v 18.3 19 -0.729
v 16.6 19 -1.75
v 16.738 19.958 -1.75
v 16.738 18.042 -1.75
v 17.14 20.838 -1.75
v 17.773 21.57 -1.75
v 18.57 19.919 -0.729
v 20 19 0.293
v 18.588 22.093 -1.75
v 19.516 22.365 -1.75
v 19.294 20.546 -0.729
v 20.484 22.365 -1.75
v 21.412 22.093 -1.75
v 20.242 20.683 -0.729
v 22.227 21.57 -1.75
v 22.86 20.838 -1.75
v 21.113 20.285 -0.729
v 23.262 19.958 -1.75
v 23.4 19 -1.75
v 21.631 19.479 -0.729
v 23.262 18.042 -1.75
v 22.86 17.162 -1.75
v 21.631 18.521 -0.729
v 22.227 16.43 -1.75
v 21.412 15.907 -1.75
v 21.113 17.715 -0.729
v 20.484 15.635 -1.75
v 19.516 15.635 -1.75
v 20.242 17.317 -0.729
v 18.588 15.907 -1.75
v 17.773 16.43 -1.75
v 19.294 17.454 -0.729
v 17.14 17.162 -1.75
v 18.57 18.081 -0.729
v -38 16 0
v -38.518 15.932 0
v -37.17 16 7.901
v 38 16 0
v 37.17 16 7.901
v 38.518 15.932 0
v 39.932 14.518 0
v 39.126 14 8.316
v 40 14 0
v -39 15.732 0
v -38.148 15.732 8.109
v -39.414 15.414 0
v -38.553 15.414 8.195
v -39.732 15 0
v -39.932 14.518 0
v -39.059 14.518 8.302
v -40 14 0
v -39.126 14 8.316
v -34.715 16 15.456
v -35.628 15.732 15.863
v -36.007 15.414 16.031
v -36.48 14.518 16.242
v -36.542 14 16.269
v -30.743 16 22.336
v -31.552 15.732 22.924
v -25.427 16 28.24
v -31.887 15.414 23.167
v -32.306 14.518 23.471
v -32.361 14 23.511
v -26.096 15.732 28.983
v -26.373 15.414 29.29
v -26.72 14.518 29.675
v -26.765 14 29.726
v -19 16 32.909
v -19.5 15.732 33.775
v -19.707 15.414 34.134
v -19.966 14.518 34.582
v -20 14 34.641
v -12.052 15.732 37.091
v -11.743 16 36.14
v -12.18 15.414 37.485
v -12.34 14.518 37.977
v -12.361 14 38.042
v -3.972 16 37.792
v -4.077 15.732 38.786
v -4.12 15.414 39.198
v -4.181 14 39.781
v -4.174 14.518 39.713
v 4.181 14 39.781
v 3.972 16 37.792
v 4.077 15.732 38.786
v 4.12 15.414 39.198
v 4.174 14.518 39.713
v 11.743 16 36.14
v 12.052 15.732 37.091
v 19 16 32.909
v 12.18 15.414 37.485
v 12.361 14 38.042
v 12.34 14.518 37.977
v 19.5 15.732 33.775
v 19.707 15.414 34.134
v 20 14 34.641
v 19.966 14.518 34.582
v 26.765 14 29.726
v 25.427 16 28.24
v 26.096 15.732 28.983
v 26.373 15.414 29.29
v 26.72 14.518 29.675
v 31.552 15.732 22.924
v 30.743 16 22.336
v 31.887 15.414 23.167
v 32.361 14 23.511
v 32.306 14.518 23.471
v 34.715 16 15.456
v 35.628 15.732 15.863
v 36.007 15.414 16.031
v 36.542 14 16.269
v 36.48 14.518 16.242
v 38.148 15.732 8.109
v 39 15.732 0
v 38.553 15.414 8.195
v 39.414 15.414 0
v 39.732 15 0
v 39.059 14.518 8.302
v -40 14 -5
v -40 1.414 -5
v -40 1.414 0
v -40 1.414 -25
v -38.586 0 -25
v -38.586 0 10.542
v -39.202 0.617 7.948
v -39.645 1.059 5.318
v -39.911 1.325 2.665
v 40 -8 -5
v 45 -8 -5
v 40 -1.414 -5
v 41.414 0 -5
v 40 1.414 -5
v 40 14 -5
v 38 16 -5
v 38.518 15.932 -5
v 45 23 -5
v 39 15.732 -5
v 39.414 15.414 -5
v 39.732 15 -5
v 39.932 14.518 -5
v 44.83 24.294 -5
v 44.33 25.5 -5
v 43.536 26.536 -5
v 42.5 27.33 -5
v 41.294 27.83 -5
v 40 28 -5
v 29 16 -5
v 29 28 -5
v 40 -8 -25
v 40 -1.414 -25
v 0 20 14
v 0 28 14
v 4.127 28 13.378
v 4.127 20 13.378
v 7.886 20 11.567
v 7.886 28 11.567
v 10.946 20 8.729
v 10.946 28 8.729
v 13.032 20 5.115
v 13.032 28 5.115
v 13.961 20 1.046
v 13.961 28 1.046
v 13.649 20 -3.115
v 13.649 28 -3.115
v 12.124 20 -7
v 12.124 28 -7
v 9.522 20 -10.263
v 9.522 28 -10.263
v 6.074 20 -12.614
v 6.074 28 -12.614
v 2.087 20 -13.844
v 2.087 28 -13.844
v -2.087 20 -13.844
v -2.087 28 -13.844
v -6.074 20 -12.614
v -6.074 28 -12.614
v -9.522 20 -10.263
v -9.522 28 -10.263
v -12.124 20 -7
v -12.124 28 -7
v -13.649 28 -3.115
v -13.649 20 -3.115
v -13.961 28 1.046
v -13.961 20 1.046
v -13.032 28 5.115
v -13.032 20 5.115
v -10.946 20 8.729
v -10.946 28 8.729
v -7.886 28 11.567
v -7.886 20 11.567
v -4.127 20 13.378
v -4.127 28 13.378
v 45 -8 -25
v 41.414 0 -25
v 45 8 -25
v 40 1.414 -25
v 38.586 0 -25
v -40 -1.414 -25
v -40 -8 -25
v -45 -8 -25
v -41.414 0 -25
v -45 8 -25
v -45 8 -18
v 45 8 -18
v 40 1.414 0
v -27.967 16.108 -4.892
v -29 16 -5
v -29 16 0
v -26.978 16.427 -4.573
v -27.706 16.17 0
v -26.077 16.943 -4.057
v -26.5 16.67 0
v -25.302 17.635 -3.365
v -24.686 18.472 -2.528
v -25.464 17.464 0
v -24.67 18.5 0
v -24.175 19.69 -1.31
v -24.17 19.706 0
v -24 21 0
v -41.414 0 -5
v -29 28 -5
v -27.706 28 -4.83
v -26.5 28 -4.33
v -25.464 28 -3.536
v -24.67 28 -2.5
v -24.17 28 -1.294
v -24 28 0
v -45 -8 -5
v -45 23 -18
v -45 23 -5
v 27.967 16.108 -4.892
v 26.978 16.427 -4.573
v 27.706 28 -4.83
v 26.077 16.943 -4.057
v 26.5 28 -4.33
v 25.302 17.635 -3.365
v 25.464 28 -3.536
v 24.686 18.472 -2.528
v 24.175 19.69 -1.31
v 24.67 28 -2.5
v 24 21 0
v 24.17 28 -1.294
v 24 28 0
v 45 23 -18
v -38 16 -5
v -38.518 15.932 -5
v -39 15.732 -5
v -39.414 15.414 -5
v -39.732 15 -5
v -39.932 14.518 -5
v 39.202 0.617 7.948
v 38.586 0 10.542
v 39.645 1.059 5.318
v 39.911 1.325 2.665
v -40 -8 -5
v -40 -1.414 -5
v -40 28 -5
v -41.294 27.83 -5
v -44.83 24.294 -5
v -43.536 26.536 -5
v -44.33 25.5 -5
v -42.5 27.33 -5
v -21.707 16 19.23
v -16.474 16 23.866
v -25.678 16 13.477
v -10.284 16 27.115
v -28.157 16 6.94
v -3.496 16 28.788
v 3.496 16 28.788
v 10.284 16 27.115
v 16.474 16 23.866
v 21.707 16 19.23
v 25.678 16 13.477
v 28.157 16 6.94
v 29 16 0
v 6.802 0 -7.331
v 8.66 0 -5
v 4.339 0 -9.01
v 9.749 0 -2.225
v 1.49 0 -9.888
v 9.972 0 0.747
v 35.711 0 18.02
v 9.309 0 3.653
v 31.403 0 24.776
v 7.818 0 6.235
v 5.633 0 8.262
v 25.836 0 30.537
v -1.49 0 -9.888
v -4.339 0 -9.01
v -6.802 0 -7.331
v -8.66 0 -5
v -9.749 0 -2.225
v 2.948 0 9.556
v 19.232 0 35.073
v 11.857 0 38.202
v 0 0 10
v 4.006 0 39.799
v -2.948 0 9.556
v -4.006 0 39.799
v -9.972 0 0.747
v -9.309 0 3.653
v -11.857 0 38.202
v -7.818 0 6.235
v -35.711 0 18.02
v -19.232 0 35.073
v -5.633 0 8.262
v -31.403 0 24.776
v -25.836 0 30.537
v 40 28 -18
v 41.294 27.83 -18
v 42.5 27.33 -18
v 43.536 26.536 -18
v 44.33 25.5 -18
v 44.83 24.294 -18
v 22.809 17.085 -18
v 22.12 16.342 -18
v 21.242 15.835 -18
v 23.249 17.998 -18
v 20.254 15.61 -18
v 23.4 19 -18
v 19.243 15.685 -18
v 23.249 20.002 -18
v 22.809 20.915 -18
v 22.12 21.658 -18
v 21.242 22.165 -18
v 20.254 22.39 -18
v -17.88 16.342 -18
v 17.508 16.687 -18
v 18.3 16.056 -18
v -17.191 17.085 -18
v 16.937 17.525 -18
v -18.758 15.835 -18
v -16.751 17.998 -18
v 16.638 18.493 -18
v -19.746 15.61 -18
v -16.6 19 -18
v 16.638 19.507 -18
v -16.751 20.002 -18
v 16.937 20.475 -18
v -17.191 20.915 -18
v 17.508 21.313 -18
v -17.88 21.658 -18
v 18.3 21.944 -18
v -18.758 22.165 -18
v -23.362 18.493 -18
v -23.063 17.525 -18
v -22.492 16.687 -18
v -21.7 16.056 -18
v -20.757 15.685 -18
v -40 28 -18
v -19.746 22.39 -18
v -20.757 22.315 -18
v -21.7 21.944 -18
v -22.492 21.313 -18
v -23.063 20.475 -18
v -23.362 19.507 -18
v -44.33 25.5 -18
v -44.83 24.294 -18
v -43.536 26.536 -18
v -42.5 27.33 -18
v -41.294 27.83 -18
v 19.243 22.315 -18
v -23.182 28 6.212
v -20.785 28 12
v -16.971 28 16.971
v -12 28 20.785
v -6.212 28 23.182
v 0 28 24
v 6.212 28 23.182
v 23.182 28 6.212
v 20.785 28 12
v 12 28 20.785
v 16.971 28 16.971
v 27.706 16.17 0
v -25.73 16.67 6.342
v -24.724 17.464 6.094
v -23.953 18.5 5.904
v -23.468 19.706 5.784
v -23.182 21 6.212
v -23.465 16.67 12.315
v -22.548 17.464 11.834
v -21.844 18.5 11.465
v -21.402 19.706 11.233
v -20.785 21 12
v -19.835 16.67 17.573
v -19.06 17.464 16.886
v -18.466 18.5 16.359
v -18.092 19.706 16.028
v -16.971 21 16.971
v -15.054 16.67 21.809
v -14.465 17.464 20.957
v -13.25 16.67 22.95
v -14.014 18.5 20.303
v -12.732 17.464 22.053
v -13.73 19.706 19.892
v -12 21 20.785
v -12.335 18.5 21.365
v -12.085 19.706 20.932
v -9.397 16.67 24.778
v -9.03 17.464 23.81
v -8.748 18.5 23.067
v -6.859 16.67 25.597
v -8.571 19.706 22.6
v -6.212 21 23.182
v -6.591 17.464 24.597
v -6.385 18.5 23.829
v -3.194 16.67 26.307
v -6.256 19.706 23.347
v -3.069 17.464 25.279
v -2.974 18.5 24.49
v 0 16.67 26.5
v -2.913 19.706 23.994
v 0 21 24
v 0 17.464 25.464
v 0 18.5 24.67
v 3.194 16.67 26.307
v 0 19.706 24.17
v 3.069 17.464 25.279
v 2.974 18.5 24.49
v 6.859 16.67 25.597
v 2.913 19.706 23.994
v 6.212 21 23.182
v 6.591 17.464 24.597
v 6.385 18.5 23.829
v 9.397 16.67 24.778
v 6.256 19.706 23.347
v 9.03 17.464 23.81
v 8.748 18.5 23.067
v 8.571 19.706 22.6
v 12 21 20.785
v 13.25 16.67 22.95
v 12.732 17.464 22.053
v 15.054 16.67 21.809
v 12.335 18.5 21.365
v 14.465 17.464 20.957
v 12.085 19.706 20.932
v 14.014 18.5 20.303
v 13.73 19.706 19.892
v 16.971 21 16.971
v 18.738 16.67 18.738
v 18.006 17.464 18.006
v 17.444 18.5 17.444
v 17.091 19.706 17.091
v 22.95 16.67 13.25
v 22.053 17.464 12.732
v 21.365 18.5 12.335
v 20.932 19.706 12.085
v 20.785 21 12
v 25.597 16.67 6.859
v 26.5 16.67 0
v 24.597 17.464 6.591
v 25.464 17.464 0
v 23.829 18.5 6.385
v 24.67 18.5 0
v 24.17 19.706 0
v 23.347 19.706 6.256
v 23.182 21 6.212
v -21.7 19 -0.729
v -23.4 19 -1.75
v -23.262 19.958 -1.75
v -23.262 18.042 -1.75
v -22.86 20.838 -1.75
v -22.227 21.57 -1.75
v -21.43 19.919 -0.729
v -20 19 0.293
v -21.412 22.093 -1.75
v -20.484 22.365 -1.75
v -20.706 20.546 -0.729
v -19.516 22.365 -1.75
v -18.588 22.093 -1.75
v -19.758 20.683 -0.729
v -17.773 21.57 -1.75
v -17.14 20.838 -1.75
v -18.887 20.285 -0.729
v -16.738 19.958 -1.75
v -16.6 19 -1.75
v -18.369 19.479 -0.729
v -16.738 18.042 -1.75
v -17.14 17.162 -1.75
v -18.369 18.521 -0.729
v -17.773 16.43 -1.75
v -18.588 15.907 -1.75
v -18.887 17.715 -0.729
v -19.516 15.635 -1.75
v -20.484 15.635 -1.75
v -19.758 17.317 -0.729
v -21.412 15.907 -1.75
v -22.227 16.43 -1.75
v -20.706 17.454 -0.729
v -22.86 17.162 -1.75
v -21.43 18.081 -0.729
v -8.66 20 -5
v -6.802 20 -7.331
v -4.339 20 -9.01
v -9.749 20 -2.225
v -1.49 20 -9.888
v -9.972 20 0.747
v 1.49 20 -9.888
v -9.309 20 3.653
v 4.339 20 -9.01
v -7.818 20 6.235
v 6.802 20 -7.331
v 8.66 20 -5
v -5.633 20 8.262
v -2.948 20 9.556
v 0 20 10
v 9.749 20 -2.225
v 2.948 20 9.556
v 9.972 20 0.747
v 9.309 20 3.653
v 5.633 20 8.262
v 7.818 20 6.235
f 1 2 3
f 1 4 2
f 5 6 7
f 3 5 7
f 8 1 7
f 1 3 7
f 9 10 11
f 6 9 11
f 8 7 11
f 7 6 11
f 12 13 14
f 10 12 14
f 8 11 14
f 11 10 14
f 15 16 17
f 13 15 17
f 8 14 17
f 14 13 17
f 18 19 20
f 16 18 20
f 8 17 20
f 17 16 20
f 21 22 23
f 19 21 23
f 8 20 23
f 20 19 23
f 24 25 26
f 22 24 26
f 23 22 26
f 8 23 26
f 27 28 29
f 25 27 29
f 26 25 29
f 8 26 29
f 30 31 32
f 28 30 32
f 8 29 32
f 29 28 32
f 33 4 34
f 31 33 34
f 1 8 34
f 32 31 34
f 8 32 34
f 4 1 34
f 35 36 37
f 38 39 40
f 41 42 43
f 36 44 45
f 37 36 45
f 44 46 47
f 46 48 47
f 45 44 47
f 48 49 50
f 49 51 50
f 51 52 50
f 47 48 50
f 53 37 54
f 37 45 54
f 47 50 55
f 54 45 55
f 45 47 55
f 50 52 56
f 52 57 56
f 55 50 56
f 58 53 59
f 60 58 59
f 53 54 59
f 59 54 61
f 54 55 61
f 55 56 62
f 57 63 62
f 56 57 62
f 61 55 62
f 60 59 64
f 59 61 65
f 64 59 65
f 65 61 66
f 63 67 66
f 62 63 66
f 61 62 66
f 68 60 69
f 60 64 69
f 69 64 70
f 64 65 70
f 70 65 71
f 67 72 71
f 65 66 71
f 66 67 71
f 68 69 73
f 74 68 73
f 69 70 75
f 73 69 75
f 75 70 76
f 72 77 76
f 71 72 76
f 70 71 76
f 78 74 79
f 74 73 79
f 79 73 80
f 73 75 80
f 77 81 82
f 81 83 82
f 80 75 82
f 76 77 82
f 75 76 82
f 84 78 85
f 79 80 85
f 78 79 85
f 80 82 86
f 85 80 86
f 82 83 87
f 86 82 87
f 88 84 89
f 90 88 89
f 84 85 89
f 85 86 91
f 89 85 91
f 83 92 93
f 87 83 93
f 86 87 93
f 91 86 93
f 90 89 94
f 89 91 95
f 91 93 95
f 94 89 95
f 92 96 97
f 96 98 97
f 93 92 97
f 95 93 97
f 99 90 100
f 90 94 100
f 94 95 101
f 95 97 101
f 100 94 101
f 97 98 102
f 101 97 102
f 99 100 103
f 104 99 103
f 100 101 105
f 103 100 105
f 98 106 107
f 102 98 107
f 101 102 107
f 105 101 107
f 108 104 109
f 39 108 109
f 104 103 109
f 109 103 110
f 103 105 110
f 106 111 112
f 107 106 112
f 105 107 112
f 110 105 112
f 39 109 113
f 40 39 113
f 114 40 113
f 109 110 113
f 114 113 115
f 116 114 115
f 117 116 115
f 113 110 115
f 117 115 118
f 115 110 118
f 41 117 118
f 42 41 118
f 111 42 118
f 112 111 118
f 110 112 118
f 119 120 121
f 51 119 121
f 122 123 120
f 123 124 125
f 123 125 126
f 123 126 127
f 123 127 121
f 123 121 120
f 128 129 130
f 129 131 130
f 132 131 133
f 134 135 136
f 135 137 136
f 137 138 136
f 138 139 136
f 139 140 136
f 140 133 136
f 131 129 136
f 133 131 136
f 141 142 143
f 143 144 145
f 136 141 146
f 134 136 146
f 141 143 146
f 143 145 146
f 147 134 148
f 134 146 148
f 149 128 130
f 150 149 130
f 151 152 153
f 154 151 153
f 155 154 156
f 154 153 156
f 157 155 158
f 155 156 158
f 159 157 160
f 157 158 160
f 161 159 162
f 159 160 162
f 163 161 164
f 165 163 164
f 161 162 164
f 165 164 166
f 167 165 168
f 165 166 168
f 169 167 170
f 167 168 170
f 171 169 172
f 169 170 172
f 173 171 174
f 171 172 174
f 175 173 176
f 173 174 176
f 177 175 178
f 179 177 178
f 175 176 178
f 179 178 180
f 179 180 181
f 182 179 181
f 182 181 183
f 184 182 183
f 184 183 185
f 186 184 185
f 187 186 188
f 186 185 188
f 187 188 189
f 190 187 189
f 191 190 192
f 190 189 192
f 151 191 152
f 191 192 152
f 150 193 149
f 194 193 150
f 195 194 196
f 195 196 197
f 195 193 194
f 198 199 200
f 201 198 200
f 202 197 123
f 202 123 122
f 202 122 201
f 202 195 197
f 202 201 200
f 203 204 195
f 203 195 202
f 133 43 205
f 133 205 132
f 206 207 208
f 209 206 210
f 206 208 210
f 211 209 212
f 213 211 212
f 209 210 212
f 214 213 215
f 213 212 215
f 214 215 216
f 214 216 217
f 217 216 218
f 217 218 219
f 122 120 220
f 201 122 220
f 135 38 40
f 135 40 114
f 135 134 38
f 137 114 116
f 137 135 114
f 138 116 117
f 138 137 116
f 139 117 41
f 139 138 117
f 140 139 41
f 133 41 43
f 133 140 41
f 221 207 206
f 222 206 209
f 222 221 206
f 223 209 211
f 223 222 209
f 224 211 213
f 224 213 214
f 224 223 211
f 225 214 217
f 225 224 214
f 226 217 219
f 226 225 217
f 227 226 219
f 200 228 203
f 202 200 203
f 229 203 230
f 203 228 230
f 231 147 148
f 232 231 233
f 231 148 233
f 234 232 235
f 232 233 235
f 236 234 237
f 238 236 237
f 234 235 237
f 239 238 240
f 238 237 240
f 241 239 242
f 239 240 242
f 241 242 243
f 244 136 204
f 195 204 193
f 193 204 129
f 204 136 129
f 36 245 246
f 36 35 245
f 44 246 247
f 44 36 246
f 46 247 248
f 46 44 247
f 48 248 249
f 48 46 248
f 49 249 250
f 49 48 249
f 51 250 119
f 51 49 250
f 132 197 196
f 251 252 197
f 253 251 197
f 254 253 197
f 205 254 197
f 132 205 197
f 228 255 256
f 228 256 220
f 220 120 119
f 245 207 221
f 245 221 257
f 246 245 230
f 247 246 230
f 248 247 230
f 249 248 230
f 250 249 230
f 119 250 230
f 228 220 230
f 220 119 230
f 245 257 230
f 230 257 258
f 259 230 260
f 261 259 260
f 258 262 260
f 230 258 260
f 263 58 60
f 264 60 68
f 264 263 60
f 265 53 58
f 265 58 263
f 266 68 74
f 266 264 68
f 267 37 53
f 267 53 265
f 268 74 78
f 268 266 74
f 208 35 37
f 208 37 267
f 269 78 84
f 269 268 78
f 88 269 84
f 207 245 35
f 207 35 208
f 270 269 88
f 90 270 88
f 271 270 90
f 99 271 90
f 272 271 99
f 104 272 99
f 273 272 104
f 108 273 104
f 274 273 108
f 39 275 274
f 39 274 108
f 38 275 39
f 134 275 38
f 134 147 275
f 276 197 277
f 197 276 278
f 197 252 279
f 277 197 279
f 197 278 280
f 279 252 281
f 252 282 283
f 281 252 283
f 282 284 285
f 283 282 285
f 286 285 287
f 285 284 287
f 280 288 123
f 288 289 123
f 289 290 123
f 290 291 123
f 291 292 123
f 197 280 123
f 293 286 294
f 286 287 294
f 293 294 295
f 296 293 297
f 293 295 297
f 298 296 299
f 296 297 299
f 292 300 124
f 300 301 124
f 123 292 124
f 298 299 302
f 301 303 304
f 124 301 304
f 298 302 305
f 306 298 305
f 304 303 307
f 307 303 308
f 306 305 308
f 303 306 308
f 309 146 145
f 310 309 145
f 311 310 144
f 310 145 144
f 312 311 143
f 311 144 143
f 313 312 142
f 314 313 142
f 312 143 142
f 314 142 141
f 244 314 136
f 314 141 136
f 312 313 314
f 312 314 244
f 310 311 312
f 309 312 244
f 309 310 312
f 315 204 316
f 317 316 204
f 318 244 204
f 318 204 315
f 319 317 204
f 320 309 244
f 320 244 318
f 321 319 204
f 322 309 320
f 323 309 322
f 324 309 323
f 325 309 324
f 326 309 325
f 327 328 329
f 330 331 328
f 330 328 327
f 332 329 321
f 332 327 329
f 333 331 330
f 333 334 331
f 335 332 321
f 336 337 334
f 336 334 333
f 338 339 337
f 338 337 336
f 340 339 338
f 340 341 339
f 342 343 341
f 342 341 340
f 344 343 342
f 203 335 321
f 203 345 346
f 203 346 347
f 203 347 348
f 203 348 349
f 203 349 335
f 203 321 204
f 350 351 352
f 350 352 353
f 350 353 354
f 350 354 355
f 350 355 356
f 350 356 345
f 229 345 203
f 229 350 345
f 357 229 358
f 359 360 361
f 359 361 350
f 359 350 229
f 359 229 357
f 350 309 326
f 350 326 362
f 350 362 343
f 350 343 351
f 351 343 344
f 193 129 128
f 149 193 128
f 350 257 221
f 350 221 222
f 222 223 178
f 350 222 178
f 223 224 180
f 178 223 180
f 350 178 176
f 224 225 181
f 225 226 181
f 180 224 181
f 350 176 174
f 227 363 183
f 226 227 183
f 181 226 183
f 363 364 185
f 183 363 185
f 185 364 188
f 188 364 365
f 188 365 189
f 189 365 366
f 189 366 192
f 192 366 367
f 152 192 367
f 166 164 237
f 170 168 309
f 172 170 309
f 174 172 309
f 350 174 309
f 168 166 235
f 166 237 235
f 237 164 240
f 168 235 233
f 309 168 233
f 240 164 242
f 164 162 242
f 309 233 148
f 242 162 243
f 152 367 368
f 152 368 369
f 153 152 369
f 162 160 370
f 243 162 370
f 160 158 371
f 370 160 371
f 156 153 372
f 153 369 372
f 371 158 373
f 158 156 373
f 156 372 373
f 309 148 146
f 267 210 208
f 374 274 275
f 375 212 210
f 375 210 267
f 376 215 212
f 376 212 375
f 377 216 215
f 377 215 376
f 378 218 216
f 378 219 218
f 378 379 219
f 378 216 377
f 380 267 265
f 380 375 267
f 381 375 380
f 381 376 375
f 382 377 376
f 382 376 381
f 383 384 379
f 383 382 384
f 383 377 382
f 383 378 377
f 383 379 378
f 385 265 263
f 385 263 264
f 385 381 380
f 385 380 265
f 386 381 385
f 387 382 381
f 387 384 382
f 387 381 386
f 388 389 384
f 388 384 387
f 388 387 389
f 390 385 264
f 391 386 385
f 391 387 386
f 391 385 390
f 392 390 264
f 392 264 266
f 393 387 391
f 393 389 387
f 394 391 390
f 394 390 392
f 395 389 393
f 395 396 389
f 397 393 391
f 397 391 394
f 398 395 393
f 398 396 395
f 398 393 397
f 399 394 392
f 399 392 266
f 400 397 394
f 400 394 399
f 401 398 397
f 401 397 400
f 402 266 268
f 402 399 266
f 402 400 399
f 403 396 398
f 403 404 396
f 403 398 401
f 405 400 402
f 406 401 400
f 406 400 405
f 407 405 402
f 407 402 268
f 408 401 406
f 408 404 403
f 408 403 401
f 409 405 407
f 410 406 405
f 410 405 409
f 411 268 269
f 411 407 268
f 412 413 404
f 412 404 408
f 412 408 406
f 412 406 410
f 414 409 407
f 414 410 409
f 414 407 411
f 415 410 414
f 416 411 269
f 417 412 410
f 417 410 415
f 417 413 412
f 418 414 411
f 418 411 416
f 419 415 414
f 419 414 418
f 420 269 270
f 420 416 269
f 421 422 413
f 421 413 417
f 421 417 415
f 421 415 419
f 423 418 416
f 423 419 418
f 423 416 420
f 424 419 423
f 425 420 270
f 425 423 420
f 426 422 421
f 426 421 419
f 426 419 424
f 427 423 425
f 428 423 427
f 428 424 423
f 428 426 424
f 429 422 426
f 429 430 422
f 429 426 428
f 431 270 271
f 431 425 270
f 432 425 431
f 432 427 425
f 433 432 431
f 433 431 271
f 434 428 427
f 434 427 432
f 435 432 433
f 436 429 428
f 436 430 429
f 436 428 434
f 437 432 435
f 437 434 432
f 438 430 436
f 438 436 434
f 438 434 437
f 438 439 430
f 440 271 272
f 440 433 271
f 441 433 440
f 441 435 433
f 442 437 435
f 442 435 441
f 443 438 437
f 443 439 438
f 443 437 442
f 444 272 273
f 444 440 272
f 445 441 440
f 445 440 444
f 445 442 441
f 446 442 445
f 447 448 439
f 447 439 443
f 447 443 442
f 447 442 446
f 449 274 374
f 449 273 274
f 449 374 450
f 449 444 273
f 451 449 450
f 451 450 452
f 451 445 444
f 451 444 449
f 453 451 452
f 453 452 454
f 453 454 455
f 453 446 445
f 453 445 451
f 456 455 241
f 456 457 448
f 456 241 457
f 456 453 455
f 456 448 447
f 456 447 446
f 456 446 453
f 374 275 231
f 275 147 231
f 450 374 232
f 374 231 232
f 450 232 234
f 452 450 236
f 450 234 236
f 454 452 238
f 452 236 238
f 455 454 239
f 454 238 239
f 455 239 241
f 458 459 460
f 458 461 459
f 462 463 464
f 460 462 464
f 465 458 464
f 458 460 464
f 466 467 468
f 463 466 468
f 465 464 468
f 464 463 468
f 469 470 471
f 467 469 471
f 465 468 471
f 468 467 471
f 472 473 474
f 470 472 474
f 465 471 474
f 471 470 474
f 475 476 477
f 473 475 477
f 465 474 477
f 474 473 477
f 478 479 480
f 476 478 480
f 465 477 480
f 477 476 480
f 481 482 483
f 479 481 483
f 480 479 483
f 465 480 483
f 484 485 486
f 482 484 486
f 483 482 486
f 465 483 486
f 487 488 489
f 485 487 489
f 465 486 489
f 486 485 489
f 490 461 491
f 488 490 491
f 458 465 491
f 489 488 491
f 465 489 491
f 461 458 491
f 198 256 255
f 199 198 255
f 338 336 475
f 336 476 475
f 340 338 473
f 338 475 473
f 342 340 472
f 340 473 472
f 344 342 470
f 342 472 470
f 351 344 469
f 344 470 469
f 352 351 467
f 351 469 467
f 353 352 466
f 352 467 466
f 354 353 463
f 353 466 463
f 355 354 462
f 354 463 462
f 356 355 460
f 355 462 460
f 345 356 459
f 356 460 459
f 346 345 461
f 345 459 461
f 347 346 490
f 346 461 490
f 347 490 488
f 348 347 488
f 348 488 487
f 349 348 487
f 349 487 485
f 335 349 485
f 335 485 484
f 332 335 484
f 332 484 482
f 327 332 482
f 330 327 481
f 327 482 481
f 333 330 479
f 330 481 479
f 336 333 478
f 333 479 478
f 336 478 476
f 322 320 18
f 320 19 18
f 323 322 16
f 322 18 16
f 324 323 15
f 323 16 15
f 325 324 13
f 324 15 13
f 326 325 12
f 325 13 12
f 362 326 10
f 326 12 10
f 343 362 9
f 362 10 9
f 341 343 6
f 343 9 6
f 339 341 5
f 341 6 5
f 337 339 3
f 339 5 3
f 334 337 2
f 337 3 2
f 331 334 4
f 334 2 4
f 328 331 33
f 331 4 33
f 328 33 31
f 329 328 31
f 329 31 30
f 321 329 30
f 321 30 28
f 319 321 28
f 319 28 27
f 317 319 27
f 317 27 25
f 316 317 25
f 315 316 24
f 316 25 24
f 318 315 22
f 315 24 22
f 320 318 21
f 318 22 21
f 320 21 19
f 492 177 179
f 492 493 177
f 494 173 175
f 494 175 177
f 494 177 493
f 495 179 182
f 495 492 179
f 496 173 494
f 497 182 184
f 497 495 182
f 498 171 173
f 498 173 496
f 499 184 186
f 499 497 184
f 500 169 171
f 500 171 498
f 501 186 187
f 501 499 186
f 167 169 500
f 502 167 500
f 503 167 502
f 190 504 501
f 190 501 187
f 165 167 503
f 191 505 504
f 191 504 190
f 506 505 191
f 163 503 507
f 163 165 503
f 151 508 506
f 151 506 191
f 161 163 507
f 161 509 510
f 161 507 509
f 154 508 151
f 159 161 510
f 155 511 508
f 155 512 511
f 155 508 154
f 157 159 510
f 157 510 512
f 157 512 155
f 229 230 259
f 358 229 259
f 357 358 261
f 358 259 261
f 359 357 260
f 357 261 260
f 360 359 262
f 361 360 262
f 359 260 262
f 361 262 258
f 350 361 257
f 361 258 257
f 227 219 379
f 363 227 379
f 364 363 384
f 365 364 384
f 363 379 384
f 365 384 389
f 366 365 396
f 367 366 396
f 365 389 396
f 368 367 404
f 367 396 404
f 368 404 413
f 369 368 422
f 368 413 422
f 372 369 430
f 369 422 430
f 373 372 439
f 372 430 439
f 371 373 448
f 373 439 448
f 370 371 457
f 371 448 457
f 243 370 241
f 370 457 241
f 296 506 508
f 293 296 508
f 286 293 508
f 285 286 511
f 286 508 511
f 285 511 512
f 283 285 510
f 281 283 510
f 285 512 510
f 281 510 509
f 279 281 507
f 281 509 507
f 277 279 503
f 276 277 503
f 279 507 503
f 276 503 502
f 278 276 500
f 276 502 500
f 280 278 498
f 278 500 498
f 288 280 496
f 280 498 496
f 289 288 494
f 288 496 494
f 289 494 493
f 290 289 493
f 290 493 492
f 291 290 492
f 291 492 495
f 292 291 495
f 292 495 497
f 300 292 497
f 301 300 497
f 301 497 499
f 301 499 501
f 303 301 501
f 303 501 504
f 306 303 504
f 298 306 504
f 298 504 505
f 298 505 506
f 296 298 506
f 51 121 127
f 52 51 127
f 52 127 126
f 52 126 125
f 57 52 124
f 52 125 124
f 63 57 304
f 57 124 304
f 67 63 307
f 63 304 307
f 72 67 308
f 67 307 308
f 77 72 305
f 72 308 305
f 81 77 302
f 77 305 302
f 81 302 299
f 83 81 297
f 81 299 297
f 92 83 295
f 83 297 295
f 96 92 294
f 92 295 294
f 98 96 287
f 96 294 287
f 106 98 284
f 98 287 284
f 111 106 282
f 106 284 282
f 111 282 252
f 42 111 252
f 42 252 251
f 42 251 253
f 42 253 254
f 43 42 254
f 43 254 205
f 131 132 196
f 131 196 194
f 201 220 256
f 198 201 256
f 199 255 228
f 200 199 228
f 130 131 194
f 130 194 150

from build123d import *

# Parameters (mm, degrees)
EXTRUDE_1_DEPTH        = 16
EXTRUDE_2_DEPTH        = 12
EXTRUDE_3_DEPTH        = 20
CUT_EXTRUDE_START      = -7
CUT_EXTRUDE_1_DEPTH    = 7
SKETCH_6_R             = 10
CUT_EXTRUDE_2_DEPTH    = 71.149839629
SKETCH_7_R             = 14
CUT_EXTRUDE_3_DEPTH    = 8
HOLE_WIZARD_M8_1_D     = 6.8
HOLE_WIZARD_M8_1_DEPTH = 16.25
HOLE_WIZARD_M8_1_TIP   = 2.042926105
CUT_EXTRUDE_4_DEPTH    = 84.868945385
FILLET_3_R             = 2
FILLET_6_R             = 5


with BuildPart() as part:
    # 草图1 → 凸台-拉伸1 (new body)
    with BuildSketch(Plane(origin=(0, 0, 0), x_dir=(1, 0, 0), z_dir=(0, 1, 0))):
        with BuildLine():
            Line((40, 5), (-40, 5))
            Line((-40, 5), (-40, 0))
            ThreePointArc((-40, 0), (0, -40), (40, 0))
            Line((40, 0), (40, 5))
        make_face()
    extrude(amount=EXTRUDE_1_DEPTH)

    # 草图3 → 凸台-拉伸2 (add)
    with BuildSketch(Plane(origin=(0, 16, 0), x_dir=(1, 0, 0), z_dir=(0, 1, 0))):
        with BuildLine():
            Line((-24, 5), (-24, 0))
            ThreePointArc((-24, 0), (0, -24), (24, 0))
            Line((24, 0), (24, 5))
            Line((24, 5), (-24, 5))
        make_face()
    extrude(amount=EXTRUDE_2_DEPTH)

    # 草图4 → 凸台-拉伸3 (add)
    with BuildSketch(Plane(origin=(0, 0, -5), x_dir=(-1, 0, 0), z_dir=(0, 0, -1))):
        with BuildLine():
            Line((-45, 23), (-45, -8))
            Line((-45, -8), (-40, -8))
            Line((-40, -8), (-40, 0))
            Line((-40, 0), (40, 0))
            Line((40, 0), (40, -8))
            Line((40, -8), (45, -8))
            Line((45, -8), (45, 23))
            ThreePointArc((45, 23), (43.535533906, 26.535533906), (40, 28))
            Line((40, 28), (-40, 28))
            ThreePointArc((-40, 28), (-43.535533906, 26.535533906), (-45, 23))
        make_face()
    extrude(amount=EXTRUDE_3_DEPTH)

    # 草图5 → 切除-拉伸1 (cut)
    with BuildSketch(Plane(origin=(0, 0, -25), x_dir=(-1, 0, 0), z_dir=(0, 0, -1)).offset(CUT_EXTRUDE_START)):
        with BuildLine():
            Line((-45, 8), (45, 8))
            Line((45, 8), (45, 23))
            ThreePointArc((45, 23), (43.535533906, 26.535533906), (40, 28))
            Line((40, 28), (-40, 28))
            ThreePointArc((-40, 28), (-43.535533906, 26.535533906), (-45, 23))
            Line((-45, 23), (-45, 8))
        make_face()
    extrude(amount=CUT_EXTRUDE_1_DEPTH, mode=Mode.SUBTRACT)

    # 草图6 → 切除-拉伸2 (cut, through all)
    with BuildSketch(Plane(origin=(0, 28, 0), x_dir=(1, 0, 0), z_dir=(0, 1, 0))):
        with Locations(Location((0, 0, 0), (0, 0, 270))):
            Circle(SKETCH_6_R)
    extrude(amount=-CUT_EXTRUDE_2_DEPTH, mode=Mode.SUBTRACT)

    # 草图7 → 切除-拉伸3 (cut)
    with BuildSketch(Plane(origin=(0, 28, 0), x_dir=(1, 0, 0), z_dir=(0, 1, 0))):
        with Locations(Location((0, 0, 0), (0, 0, 270))):
            Circle(SKETCH_7_R)
    extrude(amount=-CUT_EXTRUDE_3_DEPTH, mode=Mode.SUBTRACT)

    # M8 螺纹孔1
    with Locations(Plane(origin=(0, 0, -18), x_dir=(-1, 0, 0), z_dir=(0, 0, -1))):
        with Locations((-20, 19), (20, 19)):
            Hole(HOLE_WIZARD_M8_1_D / 2, depth=HOLE_WIZARD_M8_1_DEPTH)
            with Locations((0, 0, -(HOLE_WIZARD_M8_1_DEPTH + HOLE_WIZARD_M8_1_TIP / 2))):  # 118° drill point
                Cone(0, HOLE_WIZARD_M8_1_D / 2, HOLE_WIZARD_M8_1_TIP, mode=Mode.SUBTRACT)

    # 草图12 → 切除-拉伸4 (cut, through all)
    with BuildSketch(Plane(origin=(0, 0, -25), x_dir=(-1, 0, 0), z_dir=(0, 0, -1))):
        Polygon((-38.585786438, 0), (-40, 1.414213562), (-41.414213562, 0), (-40, -1.414213562), (-40, 0), align=None)
    cut_extrude_4 = extrude(amount=-CUT_EXTRUDE_4_DEPTH, mode=Mode.SUBTRACT)

    # 镜向1: 切除-拉伸4 across plane
    add(cut_extrude_4.mirror(Plane(origin=(0, 0, 0), x_dir=(0, 0, 1), z_dir=(1, 0, 0))), mode=Mode.SUBTRACT)

    # 圆角3
    fillet_3_edges = [part.edges().sort_by_distance(p)[0] for p in [
        (40, 16, -2.5),
        (0, 16, 40),
        (-40, 16, -2.5),
    ]]
    fillet(fillet_3_edges, radius=FILLET_3_R)

    # 圆角6
    fillet_6_edges = [part.edges().sort_by_distance(p)[0] for p in [
        (-24, 16, -2.5),
        (24, 16, -2.5),
        (-24, 22, -5),
        (24, 22, -5),
        (0, 16, 24),
    ]]
    fillet(fillet_6_edges, radius=FILLET_6_R - 0.0001)  # a hair under: the kernel refuses the full size


solid = part.part
